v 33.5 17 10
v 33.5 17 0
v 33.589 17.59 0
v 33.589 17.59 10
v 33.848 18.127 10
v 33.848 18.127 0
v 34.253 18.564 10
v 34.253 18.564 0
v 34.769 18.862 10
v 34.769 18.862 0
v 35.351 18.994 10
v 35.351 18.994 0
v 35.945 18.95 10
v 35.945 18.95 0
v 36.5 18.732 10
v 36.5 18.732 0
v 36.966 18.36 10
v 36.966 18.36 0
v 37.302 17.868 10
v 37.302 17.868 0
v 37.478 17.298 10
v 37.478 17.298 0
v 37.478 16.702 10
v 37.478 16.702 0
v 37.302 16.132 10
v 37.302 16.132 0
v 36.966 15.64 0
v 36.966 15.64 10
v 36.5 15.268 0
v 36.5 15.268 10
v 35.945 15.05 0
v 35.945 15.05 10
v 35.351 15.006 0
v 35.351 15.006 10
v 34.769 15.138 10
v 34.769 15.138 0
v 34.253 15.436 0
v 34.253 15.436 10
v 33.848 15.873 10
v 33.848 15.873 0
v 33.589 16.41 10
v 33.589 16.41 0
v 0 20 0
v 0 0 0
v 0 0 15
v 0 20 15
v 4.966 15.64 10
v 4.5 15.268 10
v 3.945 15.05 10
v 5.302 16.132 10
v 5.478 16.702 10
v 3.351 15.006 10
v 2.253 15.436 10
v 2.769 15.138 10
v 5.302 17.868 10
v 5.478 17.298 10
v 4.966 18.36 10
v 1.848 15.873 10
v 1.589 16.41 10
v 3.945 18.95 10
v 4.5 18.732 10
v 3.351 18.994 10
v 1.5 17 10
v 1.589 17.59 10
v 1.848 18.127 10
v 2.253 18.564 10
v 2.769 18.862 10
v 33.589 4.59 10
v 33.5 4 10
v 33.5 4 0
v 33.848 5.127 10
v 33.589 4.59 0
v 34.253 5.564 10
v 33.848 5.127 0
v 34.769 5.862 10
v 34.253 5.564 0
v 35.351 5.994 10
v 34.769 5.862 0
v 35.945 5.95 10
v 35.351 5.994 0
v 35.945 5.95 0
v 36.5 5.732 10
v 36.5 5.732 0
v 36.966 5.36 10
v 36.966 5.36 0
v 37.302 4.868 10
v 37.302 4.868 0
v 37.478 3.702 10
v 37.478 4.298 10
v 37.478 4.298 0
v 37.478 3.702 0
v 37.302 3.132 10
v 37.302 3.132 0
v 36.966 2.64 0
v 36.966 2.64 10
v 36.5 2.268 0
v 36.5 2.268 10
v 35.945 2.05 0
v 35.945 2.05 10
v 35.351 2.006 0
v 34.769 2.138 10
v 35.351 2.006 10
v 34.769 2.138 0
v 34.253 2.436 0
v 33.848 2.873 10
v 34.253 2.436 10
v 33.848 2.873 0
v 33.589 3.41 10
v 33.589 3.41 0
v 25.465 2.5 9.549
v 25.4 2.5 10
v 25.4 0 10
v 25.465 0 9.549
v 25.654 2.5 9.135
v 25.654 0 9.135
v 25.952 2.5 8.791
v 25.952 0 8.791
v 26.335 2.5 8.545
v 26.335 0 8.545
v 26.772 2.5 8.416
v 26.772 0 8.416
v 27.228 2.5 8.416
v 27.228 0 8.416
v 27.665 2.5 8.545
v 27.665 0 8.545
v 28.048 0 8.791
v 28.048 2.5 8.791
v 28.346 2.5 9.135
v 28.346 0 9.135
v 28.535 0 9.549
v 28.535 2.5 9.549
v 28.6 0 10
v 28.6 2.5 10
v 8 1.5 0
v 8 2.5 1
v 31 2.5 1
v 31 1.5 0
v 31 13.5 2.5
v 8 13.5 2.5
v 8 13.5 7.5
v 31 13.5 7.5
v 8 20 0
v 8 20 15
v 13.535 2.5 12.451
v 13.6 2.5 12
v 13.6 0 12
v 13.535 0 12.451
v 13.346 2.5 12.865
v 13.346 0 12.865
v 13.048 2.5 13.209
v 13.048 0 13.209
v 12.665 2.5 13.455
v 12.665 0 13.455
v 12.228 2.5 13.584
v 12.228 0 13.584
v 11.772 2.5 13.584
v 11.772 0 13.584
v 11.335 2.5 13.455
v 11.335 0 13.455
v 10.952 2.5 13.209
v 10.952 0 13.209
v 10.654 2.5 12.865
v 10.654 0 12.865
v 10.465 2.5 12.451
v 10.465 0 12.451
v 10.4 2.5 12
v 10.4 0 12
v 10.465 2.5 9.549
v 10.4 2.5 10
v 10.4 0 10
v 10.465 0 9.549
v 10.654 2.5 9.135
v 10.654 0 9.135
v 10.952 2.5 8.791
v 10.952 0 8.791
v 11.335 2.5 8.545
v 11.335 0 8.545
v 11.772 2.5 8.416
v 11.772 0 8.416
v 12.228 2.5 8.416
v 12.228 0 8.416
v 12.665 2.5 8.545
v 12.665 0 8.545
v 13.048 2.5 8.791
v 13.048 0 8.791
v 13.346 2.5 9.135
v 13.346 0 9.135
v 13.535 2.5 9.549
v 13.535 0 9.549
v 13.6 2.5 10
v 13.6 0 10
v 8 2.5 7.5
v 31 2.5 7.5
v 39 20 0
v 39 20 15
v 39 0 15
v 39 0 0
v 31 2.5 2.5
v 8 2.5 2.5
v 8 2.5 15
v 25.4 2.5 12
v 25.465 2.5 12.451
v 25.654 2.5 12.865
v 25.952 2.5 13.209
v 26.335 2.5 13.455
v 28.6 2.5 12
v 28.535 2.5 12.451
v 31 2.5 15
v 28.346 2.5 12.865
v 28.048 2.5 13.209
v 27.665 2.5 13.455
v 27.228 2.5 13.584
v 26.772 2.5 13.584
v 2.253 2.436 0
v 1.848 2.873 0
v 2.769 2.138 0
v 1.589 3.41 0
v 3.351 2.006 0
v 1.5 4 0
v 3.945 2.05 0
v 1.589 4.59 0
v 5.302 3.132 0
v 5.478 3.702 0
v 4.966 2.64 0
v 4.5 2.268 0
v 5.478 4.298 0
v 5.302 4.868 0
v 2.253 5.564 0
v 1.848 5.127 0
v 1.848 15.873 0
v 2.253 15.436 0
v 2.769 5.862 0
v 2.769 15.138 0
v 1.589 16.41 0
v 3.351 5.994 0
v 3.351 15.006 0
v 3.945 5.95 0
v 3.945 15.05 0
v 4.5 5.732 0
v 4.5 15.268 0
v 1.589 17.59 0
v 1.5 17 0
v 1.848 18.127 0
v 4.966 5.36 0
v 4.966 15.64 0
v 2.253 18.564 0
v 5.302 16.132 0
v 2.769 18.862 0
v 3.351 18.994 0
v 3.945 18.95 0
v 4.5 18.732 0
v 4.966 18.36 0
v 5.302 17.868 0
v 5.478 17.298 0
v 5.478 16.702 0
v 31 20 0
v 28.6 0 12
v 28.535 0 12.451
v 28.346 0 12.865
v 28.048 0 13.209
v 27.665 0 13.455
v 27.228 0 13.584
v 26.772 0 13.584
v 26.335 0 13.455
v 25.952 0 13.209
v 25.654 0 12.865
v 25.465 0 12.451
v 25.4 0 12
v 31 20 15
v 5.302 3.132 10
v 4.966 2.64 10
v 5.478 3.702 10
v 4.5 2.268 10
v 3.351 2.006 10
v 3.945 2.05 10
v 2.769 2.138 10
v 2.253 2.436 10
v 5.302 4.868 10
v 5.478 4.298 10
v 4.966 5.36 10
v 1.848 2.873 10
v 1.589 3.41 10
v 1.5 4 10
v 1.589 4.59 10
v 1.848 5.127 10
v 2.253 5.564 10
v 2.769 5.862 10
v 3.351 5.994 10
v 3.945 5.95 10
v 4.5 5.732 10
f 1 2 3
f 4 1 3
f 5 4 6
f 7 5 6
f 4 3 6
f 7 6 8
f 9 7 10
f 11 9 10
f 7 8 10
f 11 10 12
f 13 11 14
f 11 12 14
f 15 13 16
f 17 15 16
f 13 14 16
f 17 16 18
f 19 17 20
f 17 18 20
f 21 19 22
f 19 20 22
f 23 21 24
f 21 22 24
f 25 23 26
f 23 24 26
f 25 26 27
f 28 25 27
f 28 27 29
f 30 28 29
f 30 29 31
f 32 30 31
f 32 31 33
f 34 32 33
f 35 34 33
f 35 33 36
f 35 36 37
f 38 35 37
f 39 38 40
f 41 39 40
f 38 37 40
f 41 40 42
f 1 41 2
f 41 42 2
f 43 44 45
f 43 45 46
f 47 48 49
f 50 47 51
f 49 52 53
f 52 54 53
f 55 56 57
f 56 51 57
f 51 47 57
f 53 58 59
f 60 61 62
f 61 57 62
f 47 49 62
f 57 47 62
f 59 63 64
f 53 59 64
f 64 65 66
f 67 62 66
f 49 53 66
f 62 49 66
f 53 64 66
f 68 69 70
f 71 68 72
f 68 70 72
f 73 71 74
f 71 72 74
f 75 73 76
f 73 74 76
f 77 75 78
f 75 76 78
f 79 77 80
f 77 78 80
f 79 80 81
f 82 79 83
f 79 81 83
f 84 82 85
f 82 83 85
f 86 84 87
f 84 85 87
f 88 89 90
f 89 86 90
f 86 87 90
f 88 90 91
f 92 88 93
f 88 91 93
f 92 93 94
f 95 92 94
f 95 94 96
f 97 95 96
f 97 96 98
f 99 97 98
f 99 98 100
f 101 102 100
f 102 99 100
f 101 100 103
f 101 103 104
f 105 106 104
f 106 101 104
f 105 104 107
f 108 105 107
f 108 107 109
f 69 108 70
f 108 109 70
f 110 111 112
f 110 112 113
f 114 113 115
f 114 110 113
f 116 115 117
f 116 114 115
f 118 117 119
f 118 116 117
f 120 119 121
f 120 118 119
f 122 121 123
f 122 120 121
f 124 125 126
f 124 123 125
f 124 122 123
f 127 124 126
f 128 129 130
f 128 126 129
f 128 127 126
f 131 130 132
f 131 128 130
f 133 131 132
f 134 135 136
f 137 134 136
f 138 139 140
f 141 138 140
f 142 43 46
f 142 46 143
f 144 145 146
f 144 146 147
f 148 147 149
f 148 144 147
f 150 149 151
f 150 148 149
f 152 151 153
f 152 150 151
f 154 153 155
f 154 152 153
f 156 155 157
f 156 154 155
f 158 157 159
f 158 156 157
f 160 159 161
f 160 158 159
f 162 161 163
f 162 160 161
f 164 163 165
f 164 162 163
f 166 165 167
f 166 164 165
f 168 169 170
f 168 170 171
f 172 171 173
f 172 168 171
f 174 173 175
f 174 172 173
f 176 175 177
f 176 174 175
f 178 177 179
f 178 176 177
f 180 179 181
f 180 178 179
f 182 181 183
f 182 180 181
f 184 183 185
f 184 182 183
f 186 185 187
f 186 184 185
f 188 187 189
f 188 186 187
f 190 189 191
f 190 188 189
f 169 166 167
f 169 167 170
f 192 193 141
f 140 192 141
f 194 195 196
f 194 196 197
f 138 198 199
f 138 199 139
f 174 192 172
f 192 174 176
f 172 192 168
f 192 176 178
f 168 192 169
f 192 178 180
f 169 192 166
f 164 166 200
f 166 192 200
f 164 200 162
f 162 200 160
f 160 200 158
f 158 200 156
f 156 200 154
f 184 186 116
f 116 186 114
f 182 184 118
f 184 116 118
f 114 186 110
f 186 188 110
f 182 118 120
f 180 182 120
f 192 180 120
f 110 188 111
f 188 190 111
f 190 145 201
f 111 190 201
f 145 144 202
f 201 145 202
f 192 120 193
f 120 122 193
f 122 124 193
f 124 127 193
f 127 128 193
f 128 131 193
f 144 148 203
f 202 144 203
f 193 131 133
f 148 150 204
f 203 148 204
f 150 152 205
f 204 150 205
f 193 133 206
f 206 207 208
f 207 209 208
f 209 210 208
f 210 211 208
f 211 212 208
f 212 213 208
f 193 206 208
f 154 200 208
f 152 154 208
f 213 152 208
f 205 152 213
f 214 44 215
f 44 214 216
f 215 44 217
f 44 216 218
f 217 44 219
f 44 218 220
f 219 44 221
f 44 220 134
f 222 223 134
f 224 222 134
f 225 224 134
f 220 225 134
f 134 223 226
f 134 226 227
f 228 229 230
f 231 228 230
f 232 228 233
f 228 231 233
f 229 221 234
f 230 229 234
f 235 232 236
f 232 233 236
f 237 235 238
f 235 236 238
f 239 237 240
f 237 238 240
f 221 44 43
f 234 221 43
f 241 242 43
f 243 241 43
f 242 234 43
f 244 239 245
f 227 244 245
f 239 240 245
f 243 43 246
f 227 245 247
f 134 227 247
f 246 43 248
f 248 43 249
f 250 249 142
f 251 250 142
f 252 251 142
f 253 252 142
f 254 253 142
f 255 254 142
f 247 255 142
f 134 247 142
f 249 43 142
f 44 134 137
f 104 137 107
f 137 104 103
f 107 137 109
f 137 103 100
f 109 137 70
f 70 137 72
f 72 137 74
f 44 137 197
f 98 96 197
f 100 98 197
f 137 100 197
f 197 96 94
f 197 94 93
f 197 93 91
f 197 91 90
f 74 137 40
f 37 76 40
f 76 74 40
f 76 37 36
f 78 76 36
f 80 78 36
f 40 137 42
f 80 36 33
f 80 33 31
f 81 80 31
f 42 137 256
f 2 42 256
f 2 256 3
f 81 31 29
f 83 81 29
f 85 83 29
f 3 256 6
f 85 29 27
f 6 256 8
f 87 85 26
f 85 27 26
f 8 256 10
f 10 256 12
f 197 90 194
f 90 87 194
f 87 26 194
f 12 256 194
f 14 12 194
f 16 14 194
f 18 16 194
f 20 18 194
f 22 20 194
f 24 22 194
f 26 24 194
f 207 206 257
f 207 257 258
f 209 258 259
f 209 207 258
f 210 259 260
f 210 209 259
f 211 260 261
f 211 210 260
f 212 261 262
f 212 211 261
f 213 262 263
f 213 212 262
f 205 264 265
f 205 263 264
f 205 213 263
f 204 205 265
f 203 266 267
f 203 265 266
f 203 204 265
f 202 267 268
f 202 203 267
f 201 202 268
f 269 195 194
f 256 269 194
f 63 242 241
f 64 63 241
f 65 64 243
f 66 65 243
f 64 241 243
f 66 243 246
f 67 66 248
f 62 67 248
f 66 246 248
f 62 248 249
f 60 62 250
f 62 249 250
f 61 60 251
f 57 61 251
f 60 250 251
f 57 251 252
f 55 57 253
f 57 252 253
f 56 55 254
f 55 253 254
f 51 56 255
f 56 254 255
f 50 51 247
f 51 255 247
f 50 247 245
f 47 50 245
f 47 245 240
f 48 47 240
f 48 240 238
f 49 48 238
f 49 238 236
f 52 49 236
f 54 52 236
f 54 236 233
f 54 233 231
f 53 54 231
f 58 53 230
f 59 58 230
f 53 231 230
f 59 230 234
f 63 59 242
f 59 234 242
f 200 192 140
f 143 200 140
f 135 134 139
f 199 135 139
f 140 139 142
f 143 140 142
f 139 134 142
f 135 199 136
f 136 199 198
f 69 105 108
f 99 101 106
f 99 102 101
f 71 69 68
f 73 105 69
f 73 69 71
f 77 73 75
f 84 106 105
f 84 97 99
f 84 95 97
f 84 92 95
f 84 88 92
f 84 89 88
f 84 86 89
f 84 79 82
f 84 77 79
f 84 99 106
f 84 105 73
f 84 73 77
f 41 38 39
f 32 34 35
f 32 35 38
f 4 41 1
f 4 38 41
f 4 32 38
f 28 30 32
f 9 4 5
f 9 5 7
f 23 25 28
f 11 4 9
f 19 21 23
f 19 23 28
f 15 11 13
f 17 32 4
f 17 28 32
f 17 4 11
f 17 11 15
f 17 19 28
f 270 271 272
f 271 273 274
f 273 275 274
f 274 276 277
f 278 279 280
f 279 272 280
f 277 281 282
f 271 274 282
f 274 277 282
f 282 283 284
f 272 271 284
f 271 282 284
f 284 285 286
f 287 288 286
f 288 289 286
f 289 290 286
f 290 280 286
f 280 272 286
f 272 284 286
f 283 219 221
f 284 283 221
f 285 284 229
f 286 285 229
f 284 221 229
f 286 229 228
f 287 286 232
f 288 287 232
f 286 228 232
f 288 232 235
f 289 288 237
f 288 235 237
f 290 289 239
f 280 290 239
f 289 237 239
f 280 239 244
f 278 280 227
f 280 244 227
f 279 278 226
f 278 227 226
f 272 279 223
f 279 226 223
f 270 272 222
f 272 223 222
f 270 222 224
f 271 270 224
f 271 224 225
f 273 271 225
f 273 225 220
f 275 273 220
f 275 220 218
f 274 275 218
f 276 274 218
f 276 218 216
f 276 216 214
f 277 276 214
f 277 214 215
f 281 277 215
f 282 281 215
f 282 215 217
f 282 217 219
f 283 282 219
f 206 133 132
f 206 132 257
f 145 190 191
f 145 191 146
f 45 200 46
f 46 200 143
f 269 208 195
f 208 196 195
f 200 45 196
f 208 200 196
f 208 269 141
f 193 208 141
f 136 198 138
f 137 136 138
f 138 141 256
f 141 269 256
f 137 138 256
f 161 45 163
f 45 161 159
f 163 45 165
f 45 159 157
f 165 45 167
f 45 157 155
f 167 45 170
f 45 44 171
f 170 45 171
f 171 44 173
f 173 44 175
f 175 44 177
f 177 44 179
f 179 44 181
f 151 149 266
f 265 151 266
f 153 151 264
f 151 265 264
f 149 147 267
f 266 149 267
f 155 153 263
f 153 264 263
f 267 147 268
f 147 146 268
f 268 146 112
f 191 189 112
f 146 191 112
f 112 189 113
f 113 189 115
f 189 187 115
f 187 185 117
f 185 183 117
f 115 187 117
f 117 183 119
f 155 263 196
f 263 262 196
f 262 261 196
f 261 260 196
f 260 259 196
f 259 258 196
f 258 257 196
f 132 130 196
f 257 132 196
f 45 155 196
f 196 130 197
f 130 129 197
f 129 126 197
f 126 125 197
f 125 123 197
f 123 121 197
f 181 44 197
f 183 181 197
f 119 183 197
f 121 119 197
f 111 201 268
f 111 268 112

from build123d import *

# Parameters (mm, degrees)
SKETCH_1_W          = 8
SKETCH_1_H          = 20
EXTRUDE_1_DEPTH     = 10
EXTRUDE_1_2_DEPTH   = 10
SKETCH_2_W          = 39
SKETCH_2_H          = 15
EXTRUDE_2_DEPTH     = 2.5
CHAMFER_1_SIZE      = 1
SKETCH_3_R          = 2
CUT_EXTRUDE_1_DEPTH = 10
CUT_EXTRUDE_3_DEPTH = 10
SKETCH_6_W          = 5
SKETCH_6_H          = 17.5
EXTRUDE_3_DEPTH     = 8
SKETCH_7_W          = 5
SKETCH_7_H          = 17.5
EXTRUDE_4_DEPTH     = 8
EXTRUDE_5_REACH     = 41.825
SKETCH_8_W          = 5
SKETCH_8_H          = 11


with BuildPart() as part:
    # 草图1 → 凸台-拉伸1 (new body)
    with BuildSketch(Plane.XY):
        with Locations((4, 10)):
            Rectangle(SKETCH_1_W, SKETCH_1_H)
    extrude(amount=EXTRUDE_1_DEPTH)



with BuildPart() as body_2:
    # 草图1 → Extrude 1 2 (new body)
    with BuildSketch(Plane.XY):
        with Locations((35, 10)):
            Rectangle(SKETCH_1_W, SKETCH_1_H)
    extrude(amount=EXTRUDE_1_2_DEPTH)


with BuildPart() as part_1:
    add(part.part)

    add(body_2.part)  # 凸台-拉伸2 merges body 2
    # 草图2 → 凸台-拉伸2 (add)
    with BuildSketch(Plane.XZ):
        with Locations((19.5, 7.5)):
            Rectangle(SKETCH_2_W, SKETCH_2_H)
    extrude(amount=-EXTRUDE_2_DEPTH)

    # 倒角1
    chamfer_1_edges = [part_1.edges().sort_by_distance(p)[0] for p in [
        (19.5, 2.5, 0),
    ]]
    chamfer(chamfer_1_edges, length=CHAMFER_1_SIZE)

    # 草图3 → 切除-拉伸1 (cut)
    with BuildSketch(Plane(origin=(0, 0, 0), x_dir=(-1, 0, 0), z_dir=(0, 0, -1))):
        with Locations((-35.5, 17)):
            Circle(SKETCH_3_R)
        with Locations((-3.5, 17)):
            Circle(SKETCH_3_R)
        with Locations((-35.5, 4)):
            Circle(SKETCH_3_R)
        with Locations((-3.5, 4)):
            Circle(SKETCH_3_R)
    extrude(amount=-CUT_EXTRUDE_1_DEPTH, mode=Mode.SUBTRACT)

    # 草图5 → 切除-拉伸3 (cut)
    with BuildSketch(Plane(origin=(0, 2.5, 0), x_dir=(1, 0, 0), z_dir=(0, 1, 0))):
        with BuildLine():
            Line((10.4, -12), (10.4, -10))
            ThreePointArc((10.4, -10), (12, -8.4), (13.6, -10))
            Line((13.6, -10), (13.6, -12))
            ThreePointArc((13.6, -12), (12, -13.6), (10.4, -12))
        make_face()
        with BuildLine():
            Line((25.4, -12), (25.4, -10))
            ThreePointArc((25.4, -10), (27, -8.4), (28.6, -10))
            Line((28.6, -10), (28.6, -12))
            ThreePointArc((28.6, -12), (27, -13.6), (25.4, -12))
        make_face()
    extrude(amount=-CUT_EXTRUDE_3_DEPTH, mode=Mode.SUBTRACT)

    # 草图6 → 凸台-拉伸3 (add)
    with BuildSketch(Plane(origin=(39, 0, 0), x_dir=(0, 0, -1), z_dir=(1, 0, 0))):
        with Locations((-12.5, 11.25)):
            Rectangle(SKETCH_6_W, SKETCH_6_H)
    extrude(amount=-EXTRUDE_3_DEPTH)

    # 草图7 → 凸台-拉伸4 (add)
    with BuildSketch(Plane.ZY):
        with Locations((12.5, 11.25)):
            Rectangle(SKETCH_7_W, SKETCH_7_H)
    extrude(amount=-EXTRUDE_4_DEPTH)

    # 草图8 → 凸台-拉伸5 (add, up to next)
    with BuildSketch(Plane.ZY.offset(-31), mode=Mode.PRIVATE) as extrude_5_sk1:
        with Locations((5, 8)):
            Rectangle(SKETCH_8_W, SKETCH_8_H)
    extrude_5_tool1 = extrude(extrude_5_sk1.sketch, amount=EXTRUDE_5_REACH, mode=Mode.PRIVATE) - part_1.part
    add(extrude_5_tool1.solids().sort_by_distance((31, 8, 5))[0])


solid = part_1.part
